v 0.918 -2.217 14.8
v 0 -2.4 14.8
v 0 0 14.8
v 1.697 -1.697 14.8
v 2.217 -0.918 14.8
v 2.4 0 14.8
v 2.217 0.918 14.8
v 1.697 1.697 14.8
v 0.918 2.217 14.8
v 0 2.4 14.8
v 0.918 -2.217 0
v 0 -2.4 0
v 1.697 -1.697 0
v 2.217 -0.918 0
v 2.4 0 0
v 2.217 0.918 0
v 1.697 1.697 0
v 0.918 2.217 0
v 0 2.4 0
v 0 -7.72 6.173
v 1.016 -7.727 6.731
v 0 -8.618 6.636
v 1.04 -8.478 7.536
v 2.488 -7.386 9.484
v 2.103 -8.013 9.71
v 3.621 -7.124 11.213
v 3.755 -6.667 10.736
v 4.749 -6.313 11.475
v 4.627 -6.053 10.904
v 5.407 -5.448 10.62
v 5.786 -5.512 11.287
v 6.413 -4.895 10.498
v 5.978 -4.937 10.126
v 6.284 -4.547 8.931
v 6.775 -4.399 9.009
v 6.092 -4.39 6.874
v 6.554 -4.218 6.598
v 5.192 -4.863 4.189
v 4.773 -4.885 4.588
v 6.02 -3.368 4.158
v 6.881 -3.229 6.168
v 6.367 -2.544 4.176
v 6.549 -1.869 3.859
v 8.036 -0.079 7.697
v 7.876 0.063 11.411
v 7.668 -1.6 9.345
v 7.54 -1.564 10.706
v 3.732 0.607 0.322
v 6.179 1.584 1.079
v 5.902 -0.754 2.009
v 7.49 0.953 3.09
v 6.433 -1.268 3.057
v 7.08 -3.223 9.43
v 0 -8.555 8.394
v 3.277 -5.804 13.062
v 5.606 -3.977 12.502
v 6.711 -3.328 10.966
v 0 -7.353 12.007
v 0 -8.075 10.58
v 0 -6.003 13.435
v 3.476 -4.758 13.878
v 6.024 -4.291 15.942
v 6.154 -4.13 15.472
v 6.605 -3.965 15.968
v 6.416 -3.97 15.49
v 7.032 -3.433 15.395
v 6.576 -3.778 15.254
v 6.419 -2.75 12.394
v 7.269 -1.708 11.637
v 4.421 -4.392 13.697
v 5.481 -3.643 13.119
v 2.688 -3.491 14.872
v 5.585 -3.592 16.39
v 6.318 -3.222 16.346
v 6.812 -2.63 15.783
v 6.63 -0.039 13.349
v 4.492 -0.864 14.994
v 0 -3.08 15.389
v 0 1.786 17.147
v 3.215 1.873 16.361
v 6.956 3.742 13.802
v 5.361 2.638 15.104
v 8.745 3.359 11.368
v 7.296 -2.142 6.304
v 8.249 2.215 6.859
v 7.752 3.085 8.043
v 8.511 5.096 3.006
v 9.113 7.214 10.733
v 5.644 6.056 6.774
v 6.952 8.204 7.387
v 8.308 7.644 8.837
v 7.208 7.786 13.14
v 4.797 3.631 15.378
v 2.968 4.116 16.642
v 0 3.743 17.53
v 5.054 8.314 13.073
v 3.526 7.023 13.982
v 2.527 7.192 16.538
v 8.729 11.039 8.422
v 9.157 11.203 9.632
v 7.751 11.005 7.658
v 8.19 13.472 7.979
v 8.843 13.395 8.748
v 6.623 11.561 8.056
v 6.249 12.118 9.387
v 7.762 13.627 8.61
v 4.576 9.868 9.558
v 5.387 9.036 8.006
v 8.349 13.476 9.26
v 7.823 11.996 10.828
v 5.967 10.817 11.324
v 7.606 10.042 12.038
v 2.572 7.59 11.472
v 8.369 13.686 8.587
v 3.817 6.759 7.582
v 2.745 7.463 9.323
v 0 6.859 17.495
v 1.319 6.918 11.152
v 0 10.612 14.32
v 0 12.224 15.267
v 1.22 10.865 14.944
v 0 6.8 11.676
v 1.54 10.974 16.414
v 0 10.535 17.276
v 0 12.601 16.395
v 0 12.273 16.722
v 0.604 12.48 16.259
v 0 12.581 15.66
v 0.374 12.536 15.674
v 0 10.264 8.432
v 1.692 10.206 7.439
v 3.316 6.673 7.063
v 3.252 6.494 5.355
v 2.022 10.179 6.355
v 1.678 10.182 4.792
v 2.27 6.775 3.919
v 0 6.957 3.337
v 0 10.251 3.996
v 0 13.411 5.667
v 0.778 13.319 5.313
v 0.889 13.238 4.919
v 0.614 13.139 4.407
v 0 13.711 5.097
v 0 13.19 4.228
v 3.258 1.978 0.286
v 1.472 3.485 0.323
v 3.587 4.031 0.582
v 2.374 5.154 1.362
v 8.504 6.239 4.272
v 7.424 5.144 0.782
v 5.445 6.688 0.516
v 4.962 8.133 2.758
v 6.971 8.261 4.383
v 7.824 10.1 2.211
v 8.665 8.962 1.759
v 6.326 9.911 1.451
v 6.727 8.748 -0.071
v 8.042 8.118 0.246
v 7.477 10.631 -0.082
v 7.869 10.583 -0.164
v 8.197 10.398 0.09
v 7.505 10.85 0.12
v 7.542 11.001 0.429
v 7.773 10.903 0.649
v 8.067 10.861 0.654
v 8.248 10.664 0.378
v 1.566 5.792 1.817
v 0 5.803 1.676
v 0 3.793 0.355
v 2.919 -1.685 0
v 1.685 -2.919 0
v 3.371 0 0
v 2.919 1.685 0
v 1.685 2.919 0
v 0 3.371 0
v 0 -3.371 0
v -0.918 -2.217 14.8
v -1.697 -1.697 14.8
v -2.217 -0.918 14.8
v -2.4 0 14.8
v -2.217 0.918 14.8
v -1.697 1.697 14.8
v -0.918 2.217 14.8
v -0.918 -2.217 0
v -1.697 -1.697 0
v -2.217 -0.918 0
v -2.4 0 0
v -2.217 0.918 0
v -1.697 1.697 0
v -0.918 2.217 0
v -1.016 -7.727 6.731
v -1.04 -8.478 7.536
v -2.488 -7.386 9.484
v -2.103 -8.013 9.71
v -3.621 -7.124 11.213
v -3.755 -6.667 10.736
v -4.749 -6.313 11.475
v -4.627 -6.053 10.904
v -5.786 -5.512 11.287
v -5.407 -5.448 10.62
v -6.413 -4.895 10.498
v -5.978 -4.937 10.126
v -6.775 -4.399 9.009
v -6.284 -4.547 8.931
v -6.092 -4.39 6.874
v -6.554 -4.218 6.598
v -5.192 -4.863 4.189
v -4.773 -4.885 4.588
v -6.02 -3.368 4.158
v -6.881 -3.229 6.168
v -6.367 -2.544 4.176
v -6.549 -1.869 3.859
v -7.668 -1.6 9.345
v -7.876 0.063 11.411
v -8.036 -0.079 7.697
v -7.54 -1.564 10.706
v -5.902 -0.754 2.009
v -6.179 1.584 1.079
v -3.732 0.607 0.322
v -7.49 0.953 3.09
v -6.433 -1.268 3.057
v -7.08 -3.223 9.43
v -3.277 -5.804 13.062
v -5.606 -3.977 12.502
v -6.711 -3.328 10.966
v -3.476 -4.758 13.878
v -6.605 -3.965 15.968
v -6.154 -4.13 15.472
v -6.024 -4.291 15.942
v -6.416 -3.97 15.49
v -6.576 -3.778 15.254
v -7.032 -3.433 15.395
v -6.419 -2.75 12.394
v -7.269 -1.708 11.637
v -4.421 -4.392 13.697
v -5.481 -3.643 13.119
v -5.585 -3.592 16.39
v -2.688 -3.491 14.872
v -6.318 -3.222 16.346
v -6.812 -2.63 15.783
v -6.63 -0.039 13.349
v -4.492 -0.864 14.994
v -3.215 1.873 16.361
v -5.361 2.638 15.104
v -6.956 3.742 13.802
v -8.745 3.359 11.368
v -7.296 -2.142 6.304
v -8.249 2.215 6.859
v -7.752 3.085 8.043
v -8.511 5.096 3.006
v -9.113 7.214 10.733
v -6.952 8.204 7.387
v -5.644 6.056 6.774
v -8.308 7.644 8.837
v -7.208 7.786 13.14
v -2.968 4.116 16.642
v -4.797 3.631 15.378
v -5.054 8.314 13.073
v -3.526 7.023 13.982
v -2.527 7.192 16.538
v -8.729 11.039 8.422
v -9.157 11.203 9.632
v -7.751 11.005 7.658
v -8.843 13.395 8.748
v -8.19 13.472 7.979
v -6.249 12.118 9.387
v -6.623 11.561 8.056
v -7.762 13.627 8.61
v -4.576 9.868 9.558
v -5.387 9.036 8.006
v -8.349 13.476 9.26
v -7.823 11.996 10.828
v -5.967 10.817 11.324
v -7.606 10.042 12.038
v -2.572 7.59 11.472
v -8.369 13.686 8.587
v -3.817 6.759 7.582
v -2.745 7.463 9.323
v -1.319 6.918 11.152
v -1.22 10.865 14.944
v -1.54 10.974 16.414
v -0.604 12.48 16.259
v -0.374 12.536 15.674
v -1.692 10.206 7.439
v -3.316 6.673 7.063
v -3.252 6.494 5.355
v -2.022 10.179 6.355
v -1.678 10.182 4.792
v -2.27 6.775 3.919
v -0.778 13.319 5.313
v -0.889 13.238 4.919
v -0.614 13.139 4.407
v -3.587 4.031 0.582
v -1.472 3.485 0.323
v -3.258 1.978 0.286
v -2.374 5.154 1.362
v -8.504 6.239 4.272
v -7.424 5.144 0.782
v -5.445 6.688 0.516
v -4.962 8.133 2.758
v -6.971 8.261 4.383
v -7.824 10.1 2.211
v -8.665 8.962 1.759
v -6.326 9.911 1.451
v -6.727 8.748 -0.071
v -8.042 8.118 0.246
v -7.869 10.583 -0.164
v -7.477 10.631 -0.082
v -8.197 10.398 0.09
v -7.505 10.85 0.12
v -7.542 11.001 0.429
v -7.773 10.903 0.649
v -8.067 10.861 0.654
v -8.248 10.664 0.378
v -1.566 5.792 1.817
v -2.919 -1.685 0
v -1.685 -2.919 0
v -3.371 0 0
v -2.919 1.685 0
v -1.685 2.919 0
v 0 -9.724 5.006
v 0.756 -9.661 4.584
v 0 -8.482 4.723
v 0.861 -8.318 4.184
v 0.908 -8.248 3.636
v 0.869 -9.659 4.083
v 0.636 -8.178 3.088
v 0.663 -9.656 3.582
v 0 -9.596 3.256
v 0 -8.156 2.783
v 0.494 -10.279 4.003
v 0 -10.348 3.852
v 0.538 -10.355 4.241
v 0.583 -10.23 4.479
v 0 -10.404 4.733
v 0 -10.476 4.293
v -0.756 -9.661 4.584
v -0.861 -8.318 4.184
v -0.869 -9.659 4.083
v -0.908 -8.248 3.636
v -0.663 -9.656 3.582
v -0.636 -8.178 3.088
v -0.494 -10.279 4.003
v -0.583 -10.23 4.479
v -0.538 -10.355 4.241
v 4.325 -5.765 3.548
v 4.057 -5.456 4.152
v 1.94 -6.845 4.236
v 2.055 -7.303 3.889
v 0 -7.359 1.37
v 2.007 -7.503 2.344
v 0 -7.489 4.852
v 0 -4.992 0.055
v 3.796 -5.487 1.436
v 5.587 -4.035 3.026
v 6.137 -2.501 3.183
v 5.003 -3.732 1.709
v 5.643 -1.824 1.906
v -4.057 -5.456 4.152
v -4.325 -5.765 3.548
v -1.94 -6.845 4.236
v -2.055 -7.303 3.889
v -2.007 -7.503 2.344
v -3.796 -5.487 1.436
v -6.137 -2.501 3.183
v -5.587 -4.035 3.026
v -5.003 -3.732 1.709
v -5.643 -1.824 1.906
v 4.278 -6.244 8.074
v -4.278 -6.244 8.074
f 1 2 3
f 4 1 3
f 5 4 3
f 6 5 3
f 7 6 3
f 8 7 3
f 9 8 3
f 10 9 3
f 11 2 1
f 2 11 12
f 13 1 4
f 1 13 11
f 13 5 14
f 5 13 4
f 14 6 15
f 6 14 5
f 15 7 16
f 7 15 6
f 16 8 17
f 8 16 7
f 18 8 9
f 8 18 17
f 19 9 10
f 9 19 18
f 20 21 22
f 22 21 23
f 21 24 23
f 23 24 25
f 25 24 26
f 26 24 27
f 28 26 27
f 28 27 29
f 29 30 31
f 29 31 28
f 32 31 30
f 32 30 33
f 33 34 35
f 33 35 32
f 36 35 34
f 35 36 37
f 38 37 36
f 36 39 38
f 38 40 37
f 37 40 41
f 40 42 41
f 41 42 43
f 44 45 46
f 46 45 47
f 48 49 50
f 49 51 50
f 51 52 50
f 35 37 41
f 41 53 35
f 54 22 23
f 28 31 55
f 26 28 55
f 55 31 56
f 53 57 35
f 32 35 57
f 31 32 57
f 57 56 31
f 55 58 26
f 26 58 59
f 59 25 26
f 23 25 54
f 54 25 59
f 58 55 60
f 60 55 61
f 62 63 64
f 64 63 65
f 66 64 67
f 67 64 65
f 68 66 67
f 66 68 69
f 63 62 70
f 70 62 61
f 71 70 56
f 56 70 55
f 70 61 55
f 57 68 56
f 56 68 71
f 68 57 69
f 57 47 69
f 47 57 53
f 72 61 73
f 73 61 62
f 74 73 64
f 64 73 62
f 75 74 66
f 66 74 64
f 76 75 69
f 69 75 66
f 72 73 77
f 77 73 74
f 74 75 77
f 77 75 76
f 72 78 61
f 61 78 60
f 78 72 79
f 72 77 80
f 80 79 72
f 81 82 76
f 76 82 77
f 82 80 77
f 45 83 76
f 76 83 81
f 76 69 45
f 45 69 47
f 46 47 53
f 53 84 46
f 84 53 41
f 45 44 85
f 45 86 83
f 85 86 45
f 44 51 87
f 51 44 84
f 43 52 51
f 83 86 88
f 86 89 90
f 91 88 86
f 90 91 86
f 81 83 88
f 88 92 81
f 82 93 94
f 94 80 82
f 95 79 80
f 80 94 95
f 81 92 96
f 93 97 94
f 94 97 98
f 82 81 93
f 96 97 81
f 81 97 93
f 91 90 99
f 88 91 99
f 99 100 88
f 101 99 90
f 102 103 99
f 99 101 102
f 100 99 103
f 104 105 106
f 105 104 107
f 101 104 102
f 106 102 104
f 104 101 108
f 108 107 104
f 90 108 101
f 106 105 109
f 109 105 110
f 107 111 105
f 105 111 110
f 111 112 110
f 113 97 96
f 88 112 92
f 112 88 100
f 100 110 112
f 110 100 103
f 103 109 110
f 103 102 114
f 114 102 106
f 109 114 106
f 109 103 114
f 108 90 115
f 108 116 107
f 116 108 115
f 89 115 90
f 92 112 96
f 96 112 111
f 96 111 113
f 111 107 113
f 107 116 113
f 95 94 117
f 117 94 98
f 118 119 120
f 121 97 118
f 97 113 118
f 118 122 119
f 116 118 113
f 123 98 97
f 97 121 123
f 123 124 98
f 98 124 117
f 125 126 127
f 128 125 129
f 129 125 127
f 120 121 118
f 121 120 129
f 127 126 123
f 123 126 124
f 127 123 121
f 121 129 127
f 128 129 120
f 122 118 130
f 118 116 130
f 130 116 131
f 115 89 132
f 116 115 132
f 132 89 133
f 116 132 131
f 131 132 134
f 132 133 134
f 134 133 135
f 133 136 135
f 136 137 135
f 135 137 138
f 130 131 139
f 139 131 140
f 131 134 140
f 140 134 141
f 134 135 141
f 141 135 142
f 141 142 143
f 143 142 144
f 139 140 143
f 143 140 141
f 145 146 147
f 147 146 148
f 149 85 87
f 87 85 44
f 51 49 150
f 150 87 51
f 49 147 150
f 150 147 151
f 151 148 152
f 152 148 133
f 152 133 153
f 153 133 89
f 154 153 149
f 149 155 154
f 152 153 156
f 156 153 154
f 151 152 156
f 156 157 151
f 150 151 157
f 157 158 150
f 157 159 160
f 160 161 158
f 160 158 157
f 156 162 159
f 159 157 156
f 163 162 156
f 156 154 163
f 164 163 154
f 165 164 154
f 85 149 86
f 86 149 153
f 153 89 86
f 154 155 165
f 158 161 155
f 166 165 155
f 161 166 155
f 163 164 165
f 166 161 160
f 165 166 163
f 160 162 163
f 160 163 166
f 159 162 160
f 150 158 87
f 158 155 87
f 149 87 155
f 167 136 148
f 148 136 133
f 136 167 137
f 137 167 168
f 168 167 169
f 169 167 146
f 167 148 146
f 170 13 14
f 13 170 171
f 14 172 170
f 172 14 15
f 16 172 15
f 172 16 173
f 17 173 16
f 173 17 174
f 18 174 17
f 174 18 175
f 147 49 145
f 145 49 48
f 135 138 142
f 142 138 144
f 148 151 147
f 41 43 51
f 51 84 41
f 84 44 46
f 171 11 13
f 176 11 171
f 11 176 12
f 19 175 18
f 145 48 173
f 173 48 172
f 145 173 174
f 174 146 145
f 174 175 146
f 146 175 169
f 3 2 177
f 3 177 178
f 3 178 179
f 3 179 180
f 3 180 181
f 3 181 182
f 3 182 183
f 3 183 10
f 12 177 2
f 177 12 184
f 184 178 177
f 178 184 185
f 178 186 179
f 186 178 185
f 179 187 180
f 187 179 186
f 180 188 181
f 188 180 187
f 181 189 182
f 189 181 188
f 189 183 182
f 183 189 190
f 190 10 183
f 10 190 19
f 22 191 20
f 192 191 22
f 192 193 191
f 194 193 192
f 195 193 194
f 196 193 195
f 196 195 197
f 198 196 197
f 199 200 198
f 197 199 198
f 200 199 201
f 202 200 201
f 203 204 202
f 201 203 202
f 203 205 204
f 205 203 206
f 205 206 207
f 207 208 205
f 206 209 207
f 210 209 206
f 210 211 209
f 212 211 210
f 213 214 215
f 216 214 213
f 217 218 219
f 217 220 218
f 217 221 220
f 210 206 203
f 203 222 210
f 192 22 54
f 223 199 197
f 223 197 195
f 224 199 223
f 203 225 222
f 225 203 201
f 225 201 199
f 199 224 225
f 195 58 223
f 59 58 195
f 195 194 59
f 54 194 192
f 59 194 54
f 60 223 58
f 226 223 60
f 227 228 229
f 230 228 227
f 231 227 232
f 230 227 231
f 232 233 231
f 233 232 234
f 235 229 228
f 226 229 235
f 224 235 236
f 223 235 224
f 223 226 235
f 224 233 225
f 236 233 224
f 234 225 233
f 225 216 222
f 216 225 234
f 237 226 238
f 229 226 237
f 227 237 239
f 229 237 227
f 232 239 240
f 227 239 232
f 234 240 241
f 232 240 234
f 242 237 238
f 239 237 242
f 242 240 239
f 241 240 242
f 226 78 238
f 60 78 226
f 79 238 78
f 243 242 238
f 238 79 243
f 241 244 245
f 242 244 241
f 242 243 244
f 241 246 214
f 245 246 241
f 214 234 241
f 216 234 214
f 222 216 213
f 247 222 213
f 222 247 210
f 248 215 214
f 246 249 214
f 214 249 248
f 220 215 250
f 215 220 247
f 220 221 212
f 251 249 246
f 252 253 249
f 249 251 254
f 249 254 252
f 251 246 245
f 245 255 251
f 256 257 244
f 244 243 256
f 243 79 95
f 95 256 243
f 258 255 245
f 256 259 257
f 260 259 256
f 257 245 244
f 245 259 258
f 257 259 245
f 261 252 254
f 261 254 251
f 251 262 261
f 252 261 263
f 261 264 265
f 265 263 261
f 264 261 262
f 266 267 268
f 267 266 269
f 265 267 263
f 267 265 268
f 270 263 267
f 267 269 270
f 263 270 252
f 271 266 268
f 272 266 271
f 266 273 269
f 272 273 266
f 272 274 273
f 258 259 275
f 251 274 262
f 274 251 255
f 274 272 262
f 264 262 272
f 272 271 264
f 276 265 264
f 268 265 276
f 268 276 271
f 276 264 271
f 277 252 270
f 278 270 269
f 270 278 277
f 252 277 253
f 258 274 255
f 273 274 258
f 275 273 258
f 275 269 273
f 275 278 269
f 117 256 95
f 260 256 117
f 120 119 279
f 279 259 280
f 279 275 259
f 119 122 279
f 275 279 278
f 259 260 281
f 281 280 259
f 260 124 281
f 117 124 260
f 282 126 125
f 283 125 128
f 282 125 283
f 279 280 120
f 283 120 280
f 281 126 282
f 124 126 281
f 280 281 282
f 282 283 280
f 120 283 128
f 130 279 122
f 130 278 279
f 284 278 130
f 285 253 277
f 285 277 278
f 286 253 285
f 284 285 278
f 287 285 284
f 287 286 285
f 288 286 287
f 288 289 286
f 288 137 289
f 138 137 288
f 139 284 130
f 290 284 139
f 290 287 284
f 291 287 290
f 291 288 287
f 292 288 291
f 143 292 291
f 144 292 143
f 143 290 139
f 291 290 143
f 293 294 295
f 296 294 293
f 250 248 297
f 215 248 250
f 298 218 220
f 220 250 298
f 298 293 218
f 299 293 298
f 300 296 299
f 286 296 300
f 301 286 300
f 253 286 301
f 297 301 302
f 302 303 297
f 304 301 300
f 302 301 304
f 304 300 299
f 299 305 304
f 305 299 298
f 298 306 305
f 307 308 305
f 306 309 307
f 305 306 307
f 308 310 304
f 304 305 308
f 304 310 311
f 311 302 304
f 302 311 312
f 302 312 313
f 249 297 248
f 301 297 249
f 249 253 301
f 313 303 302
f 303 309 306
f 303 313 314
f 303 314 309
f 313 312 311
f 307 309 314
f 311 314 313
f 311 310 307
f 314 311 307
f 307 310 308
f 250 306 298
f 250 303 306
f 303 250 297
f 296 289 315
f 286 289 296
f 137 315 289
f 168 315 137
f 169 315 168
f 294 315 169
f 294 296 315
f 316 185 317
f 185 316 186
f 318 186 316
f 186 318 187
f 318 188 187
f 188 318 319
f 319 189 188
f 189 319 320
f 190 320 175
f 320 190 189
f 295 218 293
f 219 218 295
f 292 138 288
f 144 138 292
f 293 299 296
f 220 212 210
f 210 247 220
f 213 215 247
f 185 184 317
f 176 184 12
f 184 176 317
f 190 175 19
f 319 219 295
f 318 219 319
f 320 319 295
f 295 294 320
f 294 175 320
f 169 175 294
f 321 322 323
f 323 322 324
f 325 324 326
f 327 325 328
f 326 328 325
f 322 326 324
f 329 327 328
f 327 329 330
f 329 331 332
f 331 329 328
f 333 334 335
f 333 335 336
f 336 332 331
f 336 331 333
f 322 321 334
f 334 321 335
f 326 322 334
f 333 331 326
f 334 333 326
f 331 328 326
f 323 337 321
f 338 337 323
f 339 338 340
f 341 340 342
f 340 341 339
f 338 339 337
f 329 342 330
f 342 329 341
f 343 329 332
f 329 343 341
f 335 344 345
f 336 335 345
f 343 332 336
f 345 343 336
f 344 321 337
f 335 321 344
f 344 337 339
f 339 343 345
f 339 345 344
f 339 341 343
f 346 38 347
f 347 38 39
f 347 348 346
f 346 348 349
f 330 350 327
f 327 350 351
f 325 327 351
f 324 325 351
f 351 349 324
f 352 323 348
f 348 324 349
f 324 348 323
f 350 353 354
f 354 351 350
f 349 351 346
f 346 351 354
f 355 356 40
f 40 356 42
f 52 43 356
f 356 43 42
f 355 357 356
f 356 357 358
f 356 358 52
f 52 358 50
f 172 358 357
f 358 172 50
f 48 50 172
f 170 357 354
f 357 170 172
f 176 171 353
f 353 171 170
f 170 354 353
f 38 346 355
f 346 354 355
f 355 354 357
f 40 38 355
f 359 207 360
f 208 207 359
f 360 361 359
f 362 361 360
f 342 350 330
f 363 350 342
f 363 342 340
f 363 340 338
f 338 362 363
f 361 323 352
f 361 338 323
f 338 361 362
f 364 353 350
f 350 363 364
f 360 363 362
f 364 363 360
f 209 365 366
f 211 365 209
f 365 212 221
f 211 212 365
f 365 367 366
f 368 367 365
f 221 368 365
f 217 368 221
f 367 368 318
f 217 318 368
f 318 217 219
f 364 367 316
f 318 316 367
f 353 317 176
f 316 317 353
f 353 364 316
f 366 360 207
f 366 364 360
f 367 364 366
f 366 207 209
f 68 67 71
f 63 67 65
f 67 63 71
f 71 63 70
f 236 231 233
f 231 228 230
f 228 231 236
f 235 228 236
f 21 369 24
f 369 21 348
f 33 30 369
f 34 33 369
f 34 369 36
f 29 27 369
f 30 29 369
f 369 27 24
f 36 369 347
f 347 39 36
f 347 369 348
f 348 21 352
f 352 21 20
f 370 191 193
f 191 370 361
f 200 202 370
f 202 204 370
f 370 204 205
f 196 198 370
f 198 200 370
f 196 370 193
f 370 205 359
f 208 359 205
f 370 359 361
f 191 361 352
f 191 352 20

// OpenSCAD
use <../lib.scad>
use <s/26051s01.scad>
use <s/26051s02.scad>
use <s/26051s03.scad>
use <s/26051s04.scad>
function ldraw_lib__26051() = [
// 0 Minifig Head Sonic the Hedgehog
// 0 Name: 26051.dat
// 0 Author: Philippe Hurbain [Philo]
// 0 !LDRAW_ORG Part UPDATE 2020-03
// 0 !LICENSE Licensed under CC BY 4.0 : see CAreadme.txt
// 
// 0 BFC CERTIFY CCW
  [0,"BFC","CERTIFY"],
  [0,"BFC","CCW"],
// 
// 0 !HISTORY 2018-01-28 {LEGO Digital Designer} Original part shape
// 0 !HISTORY 2019-02-20 [Philo] File preparation for LDraw Parts Tracker
// 0 !HISTORY 2020-12-29 [PTadmin] Official Update 2020-03
// 
// 
// 1 16 0 0 0 1 0 0 0 1 0 0 0 1 s\26051s01.dat
  [1,16,0,0,0,1,0,0,0,1,0,0,0,1, ldraw_lib__s__26051s01()],
// 1 16 0 0 0 -1 0 0 0 1 0 0 0 1 s\26051s01.dat
  [1,16,0,0,0,-1,0,0,0,1,0,0,0,1, ldraw_lib__s__26051s01()],
// 1 16 0 0 0 1 0 0 0 1 0 0 0 1 s\26051s02.dat
  [1,16,0,0,0,1,0,0,0,1,0,0,0,1, ldraw_lib__s__26051s02()],
// 1 16 0 0 0 -1 0 0 0 1 0 0 0 1 s\26051s02.dat
  [1,16,0,0,0,-1,0,0,0,1,0,0,0,1, ldraw_lib__s__26051s02()],
// 1 16 0 0 0 1 0 0 0 1 0 0 0 1 s\26051s03.dat
  [1,16,0,0,0,1,0,0,0,1,0,0,0,1, ldraw_lib__s__26051s03()],
// 1 16 0 0 0 -1 0 0 0 1 0 0 0 1 s\26051s03.dat
  [1,16,0,0,0,-1,0,0,0,1,0,0,0,1, ldraw_lib__s__26051s03()],
// 1 16 0 0 0 1 0 0 0 1 0 0 0 1 s\26051s04.dat
  [1,16,0,0,0,1,0,0,0,1,0,0,0,1, ldraw_lib__s__26051s04()],
// 1 16 0 0 0 -1 0 0 0 1 0 0 0 1 s\26051s04.dat
  [1,16,0,0,0,-1,0,0,0,1,0,0,0,1, ldraw_lib__s__26051s04()],
// 0 // Left Eye
// 4 16 10.696 -20.186 -15.61 6.22 -23.711 -18.465 2.541 -16.827 -19.318 4.85 -10.589 -17.113
  [4,16,10.696,-20.186,-15.61,6.22,-23.711,-18.465,2.541,-16.827,-19.318,4.85,-10.589,-17.113],
// 3 16 14.946 -25.3148 -12.3427 13.517 -26.551 -13.619 10.696 -20.186 -15.61
  [3,16,14.946,-25.3148,-12.3427,13.517,-26.551,-13.619,10.696,-20.186,-15.61],
// 3 16 15.7102 -22.3279 -11.367 14.946 -25.3148 -12.3427 10.696 -20.186 -15.61
  [3,16,15.7102,-22.3279,-11.367,14.946,-25.3148,-12.3427,10.696,-20.186,-15.61],
// 3 16 15.7102 -22.3279 -11.367 10.696 -20.186 -15.61 15.23 -17.185 -10.975
  [3,16,15.7102,-22.3279,-11.367,10.696,-20.186,-15.61,15.23,-17.185,-10.975],
// 3 16 11.567 -27.2588 -15.132 9.388 -26.841 -16.668 10.696 -20.186 -15.61
  [3,16,11.567,-27.2588,-15.132,9.388,-26.841,-16.668,10.696,-20.186,-15.61],
// 3 16 13.517 -26.551 -13.619 11.567 -27.2588 -15.132 10.696 -20.186 -15.61
  [3,16,13.517,-26.551,-13.619,11.567,-27.2588,-15.132,10.696,-20.186,-15.61],
// 3 16 10.696 -20.186 -15.61 9.388 -26.841 -16.668 6.22 -23.711 -18.465
  [3,16,10.696,-20.186,-15.61,9.388,-26.841,-16.668,6.22,-23.711,-18.465],
// 3 16 15.23 -17.185 -10.975 10.696 -20.186 -15.61 10.142 -10.379 -13.641
  [3,16,15.23,-17.185,-10.975,10.696,-20.186,-15.61,10.142,-10.379,-13.641],
// 3 16 10.142 -10.379 -13.641 11.932 -11.471 -12.213 15.23 -17.185 -10.975
  [3,16,10.142,-10.379,-13.641,11.932,-11.471,-12.213,15.23,-17.185,-10.975],
// 3 16 10.142 -10.379 -13.641 10.696 -20.186 -15.61 4.85 -10.589 -17.113
  [3,16,10.142,-10.379,-13.641,10.696,-20.186,-15.61,4.85,-10.589,-17.113],
// 3 16 4.85 -10.589 -17.113 2.541 -16.827 -19.318 0 -12.13 -18.723
  [3,16,4.85,-10.589,-17.113,2.541,-16.827,-19.318,0,-12.13,-18.723],
// 3 16 0 -12.13 -18.723 2.541 -16.827 -19.318 0 -15.433 -19.3
  [3,16,0,-12.13,-18.723,2.541,-16.827,-19.318,0,-15.433,-19.3],
// 5 24 15.7102 -22.3279 -11.367 10.696 -20.186 -15.61 15.23 -17.185 -10.975 14.946 -25.3148 -12.3427
  [5,24,15.7102,-22.3279,-11.367,10.696,-20.186,-15.61,15.23,-17.185,-10.975,14.946,-25.3148,-12.3427],
// 5 24 10.696 -20.186 -15.61 10.142 -10.379 -13.641 15.23 -17.185 -10.975 4.85 -10.589 -17.113
  [5,24,10.696,-20.186,-15.61,10.142,-10.379,-13.641,15.23,-17.185,-10.975,4.85,-10.589,-17.113],
// 5 24 10.142 -10.379 -13.641 15.23 -17.185 -10.975 10.696 -20.186 -15.61 11.932 -11.471 -12.213
  [5,24,10.142,-10.379,-13.641,15.23,-17.185,-10.975,10.696,-20.186,-15.61,11.932,-11.471,-12.213],
// 5 24 15.23 -17.185 -10.975 10.696 -20.186 -15.61 15.7102 -22.3279 -11.367 10.142 -10.379 -13.641
  [5,24,15.23,-17.185,-10.975,10.696,-20.186,-15.61,15.7102,-22.3279,-11.367,10.142,-10.379,-13.641],
// 5 24 2.541 -16.827 -19.318 0 -12.13 -18.723 4.85 -10.589 -17.113 0 -15.433 -19.3
  [5,24,2.541,-16.827,-19.318,0,-12.13,-18.723,4.85,-10.589,-17.113,0,-15.433,-19.3],
// 5 24 2.541 -16.827 -19.318 4.85 -10.589 -17.113 0 -12.13 -18.723 10.696 -20.186 -15.61
  [5,24,2.541,-16.827,-19.318,4.85,-10.589,-17.113,0,-12.13,-18.723,10.696,-20.186,-15.61],
// 5 24 10.696 -20.186 -15.61 13.517 -26.551 -13.619 11.567 -27.2588 -15.132 14.946 -25.3148 -12.3427
  [5,24,10.696,-20.186,-15.61,13.517,-26.551,-13.619,11.567,-27.2588,-15.132,14.946,-25.3148,-12.3427],
// 5 24 10.696 -20.186 -15.61 14.946 -25.3148 -12.3427 13.517 -26.551 -13.619 15.7102 -22.3279 -11.367
  [5,24,10.696,-20.186,-15.61,14.946,-25.3148,-12.3427,13.517,-26.551,-13.619,15.7102,-22.3279,-11.367],
// 5 24 10.696 -20.186 -15.61 9.388 -26.841 -16.668 6.22 -23.711 -18.465 11.567 -27.2588 -15.132
  [5,24,10.696,-20.186,-15.61,9.388,-26.841,-16.668,6.22,-23.711,-18.465,11.567,-27.2588,-15.132],
// 5 24 10.696 -20.186 -15.61 4.85 -10.589 -17.113 2.541 -16.827 -19.318 10.142 -10.379 -13.641
  [5,24,10.696,-20.186,-15.61,4.85,-10.589,-17.113,2.541,-16.827,-19.318,10.142,-10.379,-13.641],
// 5 24 11.567 -27.2588 -15.132 10.696 -20.186 -15.61 9.388 -26.841 -16.668 13.517 -26.551 -13.619
  [5,24,11.567,-27.2588,-15.132,10.696,-20.186,-15.61,9.388,-26.841,-16.668,13.517,-26.551,-13.619],
// 5 24 6.22 -23.711 -18.465 10.696 -20.186 -15.61 2.541 -16.827 -19.318 9.388 -26.841 -16.668
  [5,24,6.22,-23.711,-18.465,10.696,-20.186,-15.61,2.541,-16.827,-19.318,9.388,-26.841,-16.668],
// 5 24 0 -12.13 -18.723 0 -15.433 -19.3 -2.541 -16.827 -19.318 2.541 -16.827 -19.318
  [5,24,0,-12.13,-18.723,0,-15.433,-19.3,-2.541,-16.827,-19.318,2.541,-16.827,-19.318],
// 0 // Right Eye
// 4 16 -10.696 -20.186 -15.61 -4.85 -10.589 -17.113 -2.541 -16.827 -19.318 -6.22 -23.711 -18.465
  [4,16,-10.696,-20.186,-15.61,-4.85,-10.589,-17.113,-2.541,-16.827,-19.318,-6.22,-23.711,-18.465],
// 3 16 -13.517 -26.551 -13.619 -14.946 -25.3148 -12.3427 -10.696 -20.186 -15.61
  [3,16,-13.517,-26.551,-13.619,-14.946,-25.3148,-12.3427,-10.696,-20.186,-15.61],
// 3 16 -14.946 -25.3148 -12.3427 -15.7102 -22.3279 -11.367 -10.696 -20.186 -15.61
  [3,16,-14.946,-25.3148,-12.3427,-15.7102,-22.3279,-11.367,-10.696,-20.186,-15.61],
// 3 16 -10.696 -20.186 -15.61 -15.7102 -22.3279 -11.367 -15.23 -17.185 -10.975
  [3,16,-10.696,-20.186,-15.61,-15.7102,-22.3279,-11.367,-15.23,-17.185,-10.975],
// 3 16 -9.388 -26.841 -16.668 -11.567 -27.2588 -15.132 -10.696 -20.186 -15.61
  [3,16,-9.388,-26.841,-16.668,-11.567,-27.2588,-15.132,-10.696,-20.186,-15.61],
// 3 16 -11.567 -27.2588 -15.132 -13.517 -26.551 -13.619 -10.696 -20.186 -15.61
  [3,16,-11.567,-27.2588,-15.132,-13.517,-26.551,-13.619,-10.696,-20.186,-15.61],
// 3 16 -9.388 -26.841 -16.668 -10.696 -20.186 -15.61 -6.22 -23.711 -18.465
  [3,16,-9.388,-26.841,-16.668,-10.696,-20.186,-15.61,-6.22,-23.711,-18.465],
// 3 16 -10.696 -20.186 -15.61 -15.23 -17.185 -10.975 -10.142 -10.379 -13.641
  [3,16,-10.696,-20.186,-15.61,-15.23,-17.185,-10.975,-10.142,-10.379,-13.641],
// 3 16 -11.932 -11.471 -12.213 -10.142 -10.379 -13.641 -15.23 -17.185 -10.975
  [3,16,-11.932,-11.471,-12.213,-10.142,-10.379,-13.641,-15.23,-17.185,-10.975],
// 3 16 -10.696 -20.186 -15.61 -10.142 -10.379 -13.641 -4.85 -10.589 -17.113
  [3,16,-10.696,-20.186,-15.61,-10.142,-10.379,-13.641,-4.85,-10.589,-17.113],
// 3 16 -2.541 -16.827 -19.318 -4.85 -10.589 -17.113 0 -12.13 -18.723
  [3,16,-2.541,-16.827,-19.318,-4.85,-10.589,-17.113,0,-12.13,-18.723],
// 3 16 -2.541 -16.827 -19.318 0 -12.13 -18.723 0 -15.433 -19.3
  [3,16,-2.541,-16.827,-19.318,0,-12.13,-18.723,0,-15.433,-19.3],
// 5 24 -15.7102 -22.3279 -11.367 -10.696 -20.186 -15.61 -15.23 -17.185 -10.975 -14.946 -25.3148 -12.3427
  [5,24,-15.7102,-22.3279,-11.367,-10.696,-20.186,-15.61,-15.23,-17.185,-10.975,-14.946,-25.3148,-12.3427],
// 5 24 -10.696 -20.186 -15.61 -10.142 -10.379 -13.641 -15.23 -17.185 -10.975 -4.85 -10.589 -17.113
  [5,24,-10.696,-20.186,-15.61,-10.142,-10.379,-13.641,-15.23,-17.185,-10.975,-4.85,-10.589,-17.113],
// 5 24 -10.142 -10.379 -13.641 -15.23 -17.185 -10.975 -10.696 -20.186 -15.61 -11.932 -11.471 -12.213
  [5,24,-10.142,-10.379,-13.641,-15.23,-17.185,-10.975,-10.696,-20.186,-15.61,-11.932,-11.471,-12.213],
// 5 24 -15.23 -17.185 -10.975 -10.696 -20.186 -15.61 -15.7102 -22.3279 -11.367 -10.142 -10.379 -13.641
  [5,24,-15.23,-17.185,-10.975,-10.696,-20.186,-15.61,-15.7102,-22.3279,-11.367,-10.142,-10.379,-13.641],
// 5 24 -2.541 -16.827 -19.318 0 -12.13 -18.723 -4.85 -10.589 -17.113 0 -15.433 -19.3
  [5,24,-2.541,-16.827,-19.318,0,-12.13,-18.723,-4.85,-10.589,-17.113,0,-15.433,-19.3],
// 5 24 -2.541 -16.827 -19.318 -4.85 -10.589 -17.113 0 -12.13 -18.723 -10.696 -20.186 -15.61
  [5,24,-2.541,-16.827,-19.318,-4.85,-10.589,-17.113,0,-12.13,-18.723,-10.696,-20.186,-15.61],
// 5 24 -10.696 -20.186 -15.61 -13.517 -26.551 -13.619 -11.567 -27.2588 -15.132 -14.946 -25.3148 -12.3427
  [5,24,-10.696,-20.186,-15.61,-13.517,-26.551,-13.619,-11.567,-27.2588,-15.132,-14.946,-25.3148,-12.3427],
// 5 24 -10.696 -20.186 -15.61 -14.946 -25.3148 -12.3427 -13.517 -26.551 -13.619 -15.7102 -22.3279 -11.367
  [5,24,-10.696,-20.186,-15.61,-14.946,-25.3148,-12.3427,-13.517,-26.551,-13.619,-15.7102,-22.3279,-11.367],
// 5 24 -10.696 -20.186 -15.61 -9.388 -26.841 -16.668 -6.22 -23.711 -18.465 -11.567 -27.2588 -15.132
  [5,24,-10.696,-20.186,-15.61,-9.388,-26.841,-16.668,-6.22,-23.711,-18.465,-11.567,-27.2588,-15.132],
// 5 24 -10.696 -20.186 -15.61 -4.85 -10.589 -17.113 -2.541 -16.827 -19.318 -10.142 -10.379 -13.641
  [5,24,-10.696,-20.186,-15.61,-4.85,-10.589,-17.113,-2.541,-16.827,-19.318,-10.142,-10.379,-13.641],
// 5 24 -11.567 -27.2588 -15.132 -10.696 -20.186 -15.61 -9.388 -26.841 -16.668 -13.517 -26.551 -13.619
  [5,24,-11.567,-27.2588,-15.132,-10.696,-20.186,-15.61,-9.388,-26.841,-16.668,-13.517,-26.551,-13.619],
// 5 24 -6.22 -23.711 -18.465 -10.696 -20.186 -15.61 -2.541 -16.827 -19.318 -9.388 -26.841 -16.668
  [5,24,-6.22,-23.711,-18.465,-10.696,-20.186,-15.61,-2.541,-16.827,-19.318,-9.388,-26.841,-16.668],
];
module ldraw_lib__26051(step=0, col=false, unit=2/5, alt=false, line=0.2, solid=!$preview)
    makepoly(ldraw_lib__26051(), step=step, col=col, unit=unit, alt=alt, line=line, solid=solid);
ldraw_lib__26051(line=0.2);
